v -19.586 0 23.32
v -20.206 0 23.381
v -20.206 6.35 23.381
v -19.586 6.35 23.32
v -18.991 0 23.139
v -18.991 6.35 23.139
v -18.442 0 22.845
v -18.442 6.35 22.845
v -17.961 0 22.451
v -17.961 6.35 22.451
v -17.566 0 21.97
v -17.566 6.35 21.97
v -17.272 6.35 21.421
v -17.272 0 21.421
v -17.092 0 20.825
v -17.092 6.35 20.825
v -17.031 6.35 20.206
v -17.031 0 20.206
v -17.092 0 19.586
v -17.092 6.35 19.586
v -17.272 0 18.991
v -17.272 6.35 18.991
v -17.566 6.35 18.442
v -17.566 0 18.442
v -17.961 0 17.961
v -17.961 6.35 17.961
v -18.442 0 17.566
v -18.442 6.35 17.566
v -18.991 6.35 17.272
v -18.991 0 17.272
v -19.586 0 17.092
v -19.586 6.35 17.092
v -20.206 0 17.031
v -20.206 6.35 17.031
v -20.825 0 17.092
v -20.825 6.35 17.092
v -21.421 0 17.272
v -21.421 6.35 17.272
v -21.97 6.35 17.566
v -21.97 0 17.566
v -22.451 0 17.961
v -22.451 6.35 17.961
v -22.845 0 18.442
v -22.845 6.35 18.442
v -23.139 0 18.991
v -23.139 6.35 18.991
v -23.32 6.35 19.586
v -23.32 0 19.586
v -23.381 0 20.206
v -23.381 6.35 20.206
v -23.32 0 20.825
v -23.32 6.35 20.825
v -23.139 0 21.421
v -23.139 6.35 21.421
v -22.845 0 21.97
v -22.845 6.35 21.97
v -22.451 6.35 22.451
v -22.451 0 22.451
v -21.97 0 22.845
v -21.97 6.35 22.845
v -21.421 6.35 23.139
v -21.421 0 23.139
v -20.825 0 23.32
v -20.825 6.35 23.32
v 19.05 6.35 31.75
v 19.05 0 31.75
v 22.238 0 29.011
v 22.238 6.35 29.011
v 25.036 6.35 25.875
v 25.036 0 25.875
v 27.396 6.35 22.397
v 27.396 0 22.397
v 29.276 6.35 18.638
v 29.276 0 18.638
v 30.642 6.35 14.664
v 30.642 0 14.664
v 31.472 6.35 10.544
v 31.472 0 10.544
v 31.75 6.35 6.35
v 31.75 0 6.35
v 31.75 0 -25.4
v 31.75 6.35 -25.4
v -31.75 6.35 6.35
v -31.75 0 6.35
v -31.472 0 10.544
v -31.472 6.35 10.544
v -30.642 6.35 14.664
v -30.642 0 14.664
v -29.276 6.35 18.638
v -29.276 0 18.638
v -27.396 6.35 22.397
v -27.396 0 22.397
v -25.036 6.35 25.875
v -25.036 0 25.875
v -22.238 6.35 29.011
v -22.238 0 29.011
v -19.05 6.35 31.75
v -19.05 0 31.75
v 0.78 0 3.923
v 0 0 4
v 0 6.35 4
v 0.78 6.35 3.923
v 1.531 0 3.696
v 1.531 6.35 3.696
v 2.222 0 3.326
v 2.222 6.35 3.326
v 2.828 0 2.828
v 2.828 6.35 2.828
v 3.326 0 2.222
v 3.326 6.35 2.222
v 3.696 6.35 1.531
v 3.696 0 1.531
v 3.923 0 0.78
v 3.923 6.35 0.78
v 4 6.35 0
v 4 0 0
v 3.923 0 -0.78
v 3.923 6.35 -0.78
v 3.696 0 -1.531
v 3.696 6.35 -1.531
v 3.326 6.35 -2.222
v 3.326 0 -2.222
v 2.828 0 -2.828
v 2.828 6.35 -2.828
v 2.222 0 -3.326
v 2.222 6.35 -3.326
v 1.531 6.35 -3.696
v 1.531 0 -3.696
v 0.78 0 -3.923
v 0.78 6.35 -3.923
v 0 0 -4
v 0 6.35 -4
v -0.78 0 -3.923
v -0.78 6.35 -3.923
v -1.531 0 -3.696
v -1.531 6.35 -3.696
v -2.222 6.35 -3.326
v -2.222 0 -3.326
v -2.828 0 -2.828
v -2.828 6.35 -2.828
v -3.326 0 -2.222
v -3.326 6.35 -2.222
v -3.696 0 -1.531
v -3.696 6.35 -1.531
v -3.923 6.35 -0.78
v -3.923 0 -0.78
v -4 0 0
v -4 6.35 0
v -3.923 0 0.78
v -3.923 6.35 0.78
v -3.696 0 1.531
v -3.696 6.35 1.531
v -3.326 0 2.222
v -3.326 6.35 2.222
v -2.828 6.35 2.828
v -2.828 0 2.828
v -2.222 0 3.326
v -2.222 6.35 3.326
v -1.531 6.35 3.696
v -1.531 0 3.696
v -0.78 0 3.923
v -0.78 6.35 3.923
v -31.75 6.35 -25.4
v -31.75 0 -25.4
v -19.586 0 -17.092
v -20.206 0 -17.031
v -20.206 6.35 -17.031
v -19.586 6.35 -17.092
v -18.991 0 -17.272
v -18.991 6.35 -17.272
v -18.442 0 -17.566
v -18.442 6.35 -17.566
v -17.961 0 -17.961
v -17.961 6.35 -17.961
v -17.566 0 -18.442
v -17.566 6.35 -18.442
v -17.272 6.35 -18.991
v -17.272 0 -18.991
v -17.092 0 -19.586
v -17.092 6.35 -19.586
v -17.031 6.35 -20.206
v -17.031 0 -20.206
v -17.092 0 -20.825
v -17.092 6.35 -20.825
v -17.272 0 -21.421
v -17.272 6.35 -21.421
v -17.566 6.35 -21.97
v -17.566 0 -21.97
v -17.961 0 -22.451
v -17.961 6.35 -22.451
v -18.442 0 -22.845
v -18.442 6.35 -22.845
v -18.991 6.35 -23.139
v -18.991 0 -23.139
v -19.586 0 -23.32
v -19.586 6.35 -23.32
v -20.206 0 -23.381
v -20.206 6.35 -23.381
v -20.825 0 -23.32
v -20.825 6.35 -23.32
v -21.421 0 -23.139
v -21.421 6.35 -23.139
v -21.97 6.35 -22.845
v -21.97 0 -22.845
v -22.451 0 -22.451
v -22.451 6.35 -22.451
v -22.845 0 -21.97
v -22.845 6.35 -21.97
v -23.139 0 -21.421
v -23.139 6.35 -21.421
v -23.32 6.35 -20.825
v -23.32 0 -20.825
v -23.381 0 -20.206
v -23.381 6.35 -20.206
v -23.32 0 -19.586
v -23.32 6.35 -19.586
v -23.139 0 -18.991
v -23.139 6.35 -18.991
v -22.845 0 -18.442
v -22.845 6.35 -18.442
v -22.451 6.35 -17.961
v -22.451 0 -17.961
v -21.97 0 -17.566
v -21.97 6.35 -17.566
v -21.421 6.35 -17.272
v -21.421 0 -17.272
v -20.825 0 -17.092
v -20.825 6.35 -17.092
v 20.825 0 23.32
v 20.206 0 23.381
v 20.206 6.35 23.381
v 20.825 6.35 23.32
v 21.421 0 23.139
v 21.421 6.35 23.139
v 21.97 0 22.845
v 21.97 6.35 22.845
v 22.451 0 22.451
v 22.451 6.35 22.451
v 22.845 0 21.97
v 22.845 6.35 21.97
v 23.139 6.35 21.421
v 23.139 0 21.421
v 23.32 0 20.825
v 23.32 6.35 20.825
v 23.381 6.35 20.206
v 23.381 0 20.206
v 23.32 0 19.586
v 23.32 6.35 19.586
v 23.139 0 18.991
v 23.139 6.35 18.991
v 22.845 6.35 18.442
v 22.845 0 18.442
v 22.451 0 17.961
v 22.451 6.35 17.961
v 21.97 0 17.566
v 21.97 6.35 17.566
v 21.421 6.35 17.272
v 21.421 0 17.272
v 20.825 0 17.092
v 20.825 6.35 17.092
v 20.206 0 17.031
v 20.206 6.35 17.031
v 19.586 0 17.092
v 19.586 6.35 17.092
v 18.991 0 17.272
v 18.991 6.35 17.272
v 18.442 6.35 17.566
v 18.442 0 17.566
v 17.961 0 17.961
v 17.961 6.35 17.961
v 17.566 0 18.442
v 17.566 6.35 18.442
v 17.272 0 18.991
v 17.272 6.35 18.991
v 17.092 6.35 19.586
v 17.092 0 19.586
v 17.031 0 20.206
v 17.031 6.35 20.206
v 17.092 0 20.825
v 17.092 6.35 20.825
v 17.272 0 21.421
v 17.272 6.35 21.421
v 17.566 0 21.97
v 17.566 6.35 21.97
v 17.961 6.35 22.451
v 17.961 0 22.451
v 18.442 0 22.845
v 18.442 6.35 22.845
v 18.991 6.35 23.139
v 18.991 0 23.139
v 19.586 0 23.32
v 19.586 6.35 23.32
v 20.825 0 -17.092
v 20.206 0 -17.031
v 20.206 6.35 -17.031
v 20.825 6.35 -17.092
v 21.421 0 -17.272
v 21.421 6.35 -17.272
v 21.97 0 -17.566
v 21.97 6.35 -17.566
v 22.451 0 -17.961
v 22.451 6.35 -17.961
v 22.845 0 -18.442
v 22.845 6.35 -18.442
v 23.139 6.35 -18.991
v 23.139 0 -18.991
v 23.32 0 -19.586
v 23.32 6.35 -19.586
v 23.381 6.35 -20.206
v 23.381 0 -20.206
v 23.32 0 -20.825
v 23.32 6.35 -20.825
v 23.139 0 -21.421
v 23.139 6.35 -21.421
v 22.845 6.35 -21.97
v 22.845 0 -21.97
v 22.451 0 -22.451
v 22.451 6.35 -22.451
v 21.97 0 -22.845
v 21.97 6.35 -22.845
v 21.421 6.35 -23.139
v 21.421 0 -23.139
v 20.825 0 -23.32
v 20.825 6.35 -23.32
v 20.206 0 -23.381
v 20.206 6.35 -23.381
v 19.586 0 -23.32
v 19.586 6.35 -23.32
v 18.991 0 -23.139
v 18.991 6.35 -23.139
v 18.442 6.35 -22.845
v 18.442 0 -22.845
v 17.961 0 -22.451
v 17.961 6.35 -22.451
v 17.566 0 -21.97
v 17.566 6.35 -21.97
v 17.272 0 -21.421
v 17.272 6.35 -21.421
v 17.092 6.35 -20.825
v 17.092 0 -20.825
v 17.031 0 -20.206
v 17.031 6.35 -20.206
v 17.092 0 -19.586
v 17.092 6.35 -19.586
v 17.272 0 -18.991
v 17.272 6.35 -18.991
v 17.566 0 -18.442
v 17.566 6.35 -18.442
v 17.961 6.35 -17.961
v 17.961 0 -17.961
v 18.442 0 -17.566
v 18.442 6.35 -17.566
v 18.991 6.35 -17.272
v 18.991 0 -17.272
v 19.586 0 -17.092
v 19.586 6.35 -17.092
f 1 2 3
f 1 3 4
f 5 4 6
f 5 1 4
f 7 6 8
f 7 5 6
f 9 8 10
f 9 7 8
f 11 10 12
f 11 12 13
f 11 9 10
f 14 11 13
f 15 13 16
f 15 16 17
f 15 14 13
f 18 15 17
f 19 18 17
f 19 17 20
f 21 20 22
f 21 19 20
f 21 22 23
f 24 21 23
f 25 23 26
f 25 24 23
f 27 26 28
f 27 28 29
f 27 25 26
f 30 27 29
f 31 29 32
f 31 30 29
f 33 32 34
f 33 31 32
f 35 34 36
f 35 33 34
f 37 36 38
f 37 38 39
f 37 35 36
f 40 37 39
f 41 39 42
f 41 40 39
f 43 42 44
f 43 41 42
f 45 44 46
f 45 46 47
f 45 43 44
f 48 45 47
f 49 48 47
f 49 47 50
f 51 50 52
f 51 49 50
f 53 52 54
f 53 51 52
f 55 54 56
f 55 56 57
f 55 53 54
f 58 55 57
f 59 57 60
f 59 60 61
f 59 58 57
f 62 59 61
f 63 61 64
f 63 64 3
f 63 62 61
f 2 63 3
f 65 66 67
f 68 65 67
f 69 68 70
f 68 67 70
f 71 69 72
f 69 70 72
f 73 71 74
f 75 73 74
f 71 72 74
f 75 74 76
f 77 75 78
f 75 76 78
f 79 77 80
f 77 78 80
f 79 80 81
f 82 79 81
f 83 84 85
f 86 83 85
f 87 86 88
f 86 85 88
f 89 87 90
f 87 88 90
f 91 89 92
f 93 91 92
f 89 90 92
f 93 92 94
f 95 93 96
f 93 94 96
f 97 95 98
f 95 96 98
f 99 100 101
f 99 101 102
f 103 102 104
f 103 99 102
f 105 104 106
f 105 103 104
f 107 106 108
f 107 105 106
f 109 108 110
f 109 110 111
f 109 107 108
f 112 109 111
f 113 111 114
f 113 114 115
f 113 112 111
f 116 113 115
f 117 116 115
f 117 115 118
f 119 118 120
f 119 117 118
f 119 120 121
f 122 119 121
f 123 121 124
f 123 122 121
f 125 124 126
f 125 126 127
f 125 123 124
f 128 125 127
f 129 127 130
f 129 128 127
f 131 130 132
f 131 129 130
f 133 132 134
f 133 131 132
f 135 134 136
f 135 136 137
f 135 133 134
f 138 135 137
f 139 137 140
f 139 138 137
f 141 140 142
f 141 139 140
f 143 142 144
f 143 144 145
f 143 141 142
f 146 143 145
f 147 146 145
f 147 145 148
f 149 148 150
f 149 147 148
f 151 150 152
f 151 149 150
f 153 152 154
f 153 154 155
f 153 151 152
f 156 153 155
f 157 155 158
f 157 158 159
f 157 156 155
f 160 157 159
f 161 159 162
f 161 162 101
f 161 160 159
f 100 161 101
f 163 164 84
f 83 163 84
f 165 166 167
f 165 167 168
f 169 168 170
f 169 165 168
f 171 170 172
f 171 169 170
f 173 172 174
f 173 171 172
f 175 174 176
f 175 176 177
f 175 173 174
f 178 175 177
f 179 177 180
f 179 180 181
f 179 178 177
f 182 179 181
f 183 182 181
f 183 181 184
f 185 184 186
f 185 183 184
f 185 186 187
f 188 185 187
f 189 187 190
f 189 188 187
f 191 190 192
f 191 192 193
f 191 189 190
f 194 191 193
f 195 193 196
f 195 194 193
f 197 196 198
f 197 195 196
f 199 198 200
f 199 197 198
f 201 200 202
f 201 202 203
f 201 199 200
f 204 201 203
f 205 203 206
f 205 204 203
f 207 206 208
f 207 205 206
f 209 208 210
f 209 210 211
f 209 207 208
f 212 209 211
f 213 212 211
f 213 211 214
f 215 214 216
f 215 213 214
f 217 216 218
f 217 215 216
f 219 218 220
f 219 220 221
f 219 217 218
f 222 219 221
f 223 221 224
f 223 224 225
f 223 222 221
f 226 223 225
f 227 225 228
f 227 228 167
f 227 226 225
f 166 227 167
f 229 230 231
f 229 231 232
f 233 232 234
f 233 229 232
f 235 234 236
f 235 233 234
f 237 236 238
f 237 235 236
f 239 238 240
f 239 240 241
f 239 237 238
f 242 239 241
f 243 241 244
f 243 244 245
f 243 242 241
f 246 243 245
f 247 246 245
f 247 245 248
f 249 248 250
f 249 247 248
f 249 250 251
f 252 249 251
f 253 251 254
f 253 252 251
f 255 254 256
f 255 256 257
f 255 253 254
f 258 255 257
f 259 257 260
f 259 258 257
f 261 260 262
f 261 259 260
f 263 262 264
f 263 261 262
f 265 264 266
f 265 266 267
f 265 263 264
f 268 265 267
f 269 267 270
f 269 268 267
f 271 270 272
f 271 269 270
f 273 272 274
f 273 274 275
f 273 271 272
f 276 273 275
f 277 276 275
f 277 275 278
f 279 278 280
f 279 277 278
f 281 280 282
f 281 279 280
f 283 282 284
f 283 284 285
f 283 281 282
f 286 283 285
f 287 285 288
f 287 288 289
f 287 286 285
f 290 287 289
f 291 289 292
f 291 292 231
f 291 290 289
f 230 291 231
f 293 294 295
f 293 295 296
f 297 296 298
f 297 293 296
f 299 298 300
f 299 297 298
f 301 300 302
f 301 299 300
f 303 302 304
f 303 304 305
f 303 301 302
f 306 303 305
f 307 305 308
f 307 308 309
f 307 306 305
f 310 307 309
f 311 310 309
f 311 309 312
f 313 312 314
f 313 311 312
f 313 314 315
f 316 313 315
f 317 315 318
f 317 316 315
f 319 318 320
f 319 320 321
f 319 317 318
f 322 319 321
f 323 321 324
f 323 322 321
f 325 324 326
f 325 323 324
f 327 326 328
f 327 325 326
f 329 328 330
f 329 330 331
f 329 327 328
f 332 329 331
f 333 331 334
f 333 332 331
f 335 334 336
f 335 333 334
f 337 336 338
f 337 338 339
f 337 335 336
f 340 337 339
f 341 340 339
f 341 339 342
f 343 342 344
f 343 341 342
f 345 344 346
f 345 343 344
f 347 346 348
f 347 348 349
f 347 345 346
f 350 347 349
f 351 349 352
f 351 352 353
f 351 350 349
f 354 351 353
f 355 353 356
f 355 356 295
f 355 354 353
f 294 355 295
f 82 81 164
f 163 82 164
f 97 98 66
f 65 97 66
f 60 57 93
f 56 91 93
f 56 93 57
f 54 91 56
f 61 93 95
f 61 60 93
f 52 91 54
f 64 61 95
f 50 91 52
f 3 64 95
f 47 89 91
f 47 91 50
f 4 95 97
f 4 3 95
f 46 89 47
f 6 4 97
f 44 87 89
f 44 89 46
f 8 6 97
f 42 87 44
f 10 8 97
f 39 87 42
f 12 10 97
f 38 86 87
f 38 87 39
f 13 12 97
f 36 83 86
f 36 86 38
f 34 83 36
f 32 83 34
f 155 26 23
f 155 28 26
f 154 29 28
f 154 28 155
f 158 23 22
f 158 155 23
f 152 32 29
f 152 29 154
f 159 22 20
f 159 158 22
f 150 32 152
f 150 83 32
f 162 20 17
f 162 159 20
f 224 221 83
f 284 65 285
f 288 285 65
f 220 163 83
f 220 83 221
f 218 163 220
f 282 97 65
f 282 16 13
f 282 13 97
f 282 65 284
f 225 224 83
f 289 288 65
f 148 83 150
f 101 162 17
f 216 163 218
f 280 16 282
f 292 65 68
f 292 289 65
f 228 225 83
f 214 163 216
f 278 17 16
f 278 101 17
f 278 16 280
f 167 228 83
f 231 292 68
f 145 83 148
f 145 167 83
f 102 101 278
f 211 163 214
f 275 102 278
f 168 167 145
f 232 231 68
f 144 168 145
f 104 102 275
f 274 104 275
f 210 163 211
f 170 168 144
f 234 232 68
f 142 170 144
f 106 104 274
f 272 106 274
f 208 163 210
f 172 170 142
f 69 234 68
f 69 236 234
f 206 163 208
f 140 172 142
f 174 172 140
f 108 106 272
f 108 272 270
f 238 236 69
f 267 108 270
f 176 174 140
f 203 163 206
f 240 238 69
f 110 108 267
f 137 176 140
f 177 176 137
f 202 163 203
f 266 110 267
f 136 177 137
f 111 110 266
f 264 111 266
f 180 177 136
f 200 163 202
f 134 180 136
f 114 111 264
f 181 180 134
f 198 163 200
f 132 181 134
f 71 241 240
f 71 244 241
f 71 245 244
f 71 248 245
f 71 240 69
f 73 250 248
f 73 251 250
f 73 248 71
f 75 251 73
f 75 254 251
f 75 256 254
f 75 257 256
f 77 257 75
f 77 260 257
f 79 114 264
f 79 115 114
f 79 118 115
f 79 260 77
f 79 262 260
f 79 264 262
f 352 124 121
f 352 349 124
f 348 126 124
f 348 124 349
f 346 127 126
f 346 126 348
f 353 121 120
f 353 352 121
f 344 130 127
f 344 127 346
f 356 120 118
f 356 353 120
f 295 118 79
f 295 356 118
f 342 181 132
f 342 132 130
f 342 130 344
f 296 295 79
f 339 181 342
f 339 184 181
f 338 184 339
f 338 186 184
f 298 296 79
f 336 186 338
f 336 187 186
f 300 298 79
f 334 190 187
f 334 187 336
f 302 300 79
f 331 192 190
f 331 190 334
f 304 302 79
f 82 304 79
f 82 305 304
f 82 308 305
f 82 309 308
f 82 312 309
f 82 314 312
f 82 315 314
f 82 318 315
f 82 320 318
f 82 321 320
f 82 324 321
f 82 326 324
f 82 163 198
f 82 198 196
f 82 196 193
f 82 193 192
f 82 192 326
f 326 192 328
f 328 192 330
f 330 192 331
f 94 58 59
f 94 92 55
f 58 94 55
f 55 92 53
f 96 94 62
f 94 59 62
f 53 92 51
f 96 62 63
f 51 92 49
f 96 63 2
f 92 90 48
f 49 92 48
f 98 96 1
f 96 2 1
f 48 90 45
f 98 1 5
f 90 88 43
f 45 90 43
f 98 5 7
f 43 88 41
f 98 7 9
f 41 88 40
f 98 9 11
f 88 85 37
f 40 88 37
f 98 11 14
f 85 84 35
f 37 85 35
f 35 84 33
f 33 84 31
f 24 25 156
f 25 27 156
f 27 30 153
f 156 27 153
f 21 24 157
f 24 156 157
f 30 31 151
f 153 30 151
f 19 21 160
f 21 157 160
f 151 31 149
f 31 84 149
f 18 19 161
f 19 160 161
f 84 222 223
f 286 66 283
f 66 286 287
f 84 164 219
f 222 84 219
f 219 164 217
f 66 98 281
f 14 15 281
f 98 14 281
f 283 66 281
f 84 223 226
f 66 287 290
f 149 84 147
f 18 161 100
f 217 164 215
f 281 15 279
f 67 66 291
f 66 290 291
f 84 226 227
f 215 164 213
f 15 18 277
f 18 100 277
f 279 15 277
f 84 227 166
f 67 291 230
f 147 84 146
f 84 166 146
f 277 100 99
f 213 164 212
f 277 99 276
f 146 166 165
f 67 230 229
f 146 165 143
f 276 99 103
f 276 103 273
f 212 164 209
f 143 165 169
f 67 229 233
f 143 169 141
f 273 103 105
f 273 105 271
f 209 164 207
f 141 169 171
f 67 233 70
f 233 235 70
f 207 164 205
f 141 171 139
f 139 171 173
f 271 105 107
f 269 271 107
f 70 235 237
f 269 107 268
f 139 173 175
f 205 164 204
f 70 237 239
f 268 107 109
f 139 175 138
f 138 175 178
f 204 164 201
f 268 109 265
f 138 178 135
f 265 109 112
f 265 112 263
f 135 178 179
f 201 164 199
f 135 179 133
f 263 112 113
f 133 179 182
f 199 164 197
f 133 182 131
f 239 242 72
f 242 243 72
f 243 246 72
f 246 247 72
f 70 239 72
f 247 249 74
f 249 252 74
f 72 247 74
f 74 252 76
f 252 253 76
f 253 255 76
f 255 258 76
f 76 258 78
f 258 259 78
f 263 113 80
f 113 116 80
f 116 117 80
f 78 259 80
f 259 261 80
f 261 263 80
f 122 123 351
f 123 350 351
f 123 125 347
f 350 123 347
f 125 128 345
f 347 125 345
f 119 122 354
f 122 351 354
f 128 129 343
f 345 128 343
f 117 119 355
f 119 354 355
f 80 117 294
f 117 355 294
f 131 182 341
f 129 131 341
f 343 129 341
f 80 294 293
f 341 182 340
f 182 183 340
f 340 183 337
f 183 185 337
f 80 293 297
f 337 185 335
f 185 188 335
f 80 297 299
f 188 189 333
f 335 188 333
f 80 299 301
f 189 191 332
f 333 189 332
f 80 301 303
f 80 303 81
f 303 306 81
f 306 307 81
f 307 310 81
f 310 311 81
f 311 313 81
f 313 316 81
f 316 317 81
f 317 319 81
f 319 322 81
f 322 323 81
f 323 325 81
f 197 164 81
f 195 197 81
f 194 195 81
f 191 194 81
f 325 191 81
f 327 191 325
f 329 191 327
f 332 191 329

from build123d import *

# Parameters (mm, degrees)
SKETCH1_R           = 3.175
SKETCH1_R_2         = 4
BOSS_EXTRUDE1_DEPTH = 6.35


with BuildPart() as part:
    # Sketch1 → Boss-Extrude1 (new body)
    with BuildSketch(Plane(origin=(0, 0, 0), x_dir=(1, 0, 0), z_dir=(0, 1, 0))):
        with BuildLine():
            Line((-31.75, 25.4), (-31.75, 0))
            Line((-31.75, 0), (-31.75, -6.35))
            ThreePointArc((-31.75, -6.35), (-28.398063314, -20.549031657), (-19.05, -31.75))
            Line((-19.05, -31.75), (19.05, -31.75))
            ThreePointArc((19.05, -31.75), (28.398063314, -20.549031657), (31.75, -6.35))
            Line((31.75, -6.35), (31.75, 0))
            Line((31.75, 0), (31.75, 25.4))
            Line((31.75, 25.4), (-31.75, 25.4))
        make_face()
        with Locations((-20.205576272, -20.205576272)):
            Circle(SKETCH1_R, mode=Mode.SUBTRACT)
        with Locations((20.205576272, -20.205576272)):
            Circle(SKETCH1_R, mode=Mode.SUBTRACT)
        Circle(SKETCH1_R_2, mode=Mode.SUBTRACT)
        with Locations((-20.205576272, 20.205576272)):
            Circle(SKETCH1_R, mode=Mode.SUBTRACT)
        with Locations((20.205576272, 20.205576272)):
            Circle(SKETCH1_R, mode=Mode.SUBTRACT)
    extrude(amount=BOSS_EXTRUDE1_DEPTH)


solid = part.part
